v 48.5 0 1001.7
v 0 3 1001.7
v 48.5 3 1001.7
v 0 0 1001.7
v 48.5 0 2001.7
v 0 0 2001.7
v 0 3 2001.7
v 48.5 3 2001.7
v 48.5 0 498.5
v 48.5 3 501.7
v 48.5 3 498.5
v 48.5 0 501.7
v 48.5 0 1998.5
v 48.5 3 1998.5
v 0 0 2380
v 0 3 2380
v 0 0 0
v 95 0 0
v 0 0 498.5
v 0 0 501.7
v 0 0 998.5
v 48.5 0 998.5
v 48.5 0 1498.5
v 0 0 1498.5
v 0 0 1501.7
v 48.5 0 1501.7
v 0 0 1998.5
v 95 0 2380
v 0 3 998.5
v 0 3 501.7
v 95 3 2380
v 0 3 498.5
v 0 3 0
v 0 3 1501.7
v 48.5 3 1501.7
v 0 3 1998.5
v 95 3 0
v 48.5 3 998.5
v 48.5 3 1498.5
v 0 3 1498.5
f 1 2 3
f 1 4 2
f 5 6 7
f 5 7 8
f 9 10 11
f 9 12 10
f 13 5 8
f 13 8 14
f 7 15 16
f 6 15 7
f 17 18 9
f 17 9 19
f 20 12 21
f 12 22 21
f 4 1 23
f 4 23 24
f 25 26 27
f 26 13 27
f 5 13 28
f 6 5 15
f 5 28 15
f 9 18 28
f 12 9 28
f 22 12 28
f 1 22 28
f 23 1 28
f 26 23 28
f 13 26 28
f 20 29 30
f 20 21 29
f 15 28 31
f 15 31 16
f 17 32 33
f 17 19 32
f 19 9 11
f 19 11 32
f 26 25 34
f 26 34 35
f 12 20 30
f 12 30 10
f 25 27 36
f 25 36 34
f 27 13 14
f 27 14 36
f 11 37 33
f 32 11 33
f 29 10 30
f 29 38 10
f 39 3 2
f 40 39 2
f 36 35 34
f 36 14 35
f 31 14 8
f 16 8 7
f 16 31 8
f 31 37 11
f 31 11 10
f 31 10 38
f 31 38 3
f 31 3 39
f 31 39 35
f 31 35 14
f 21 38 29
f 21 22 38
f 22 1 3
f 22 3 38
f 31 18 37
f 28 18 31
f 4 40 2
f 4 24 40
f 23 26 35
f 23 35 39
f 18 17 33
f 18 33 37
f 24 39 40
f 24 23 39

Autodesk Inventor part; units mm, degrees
ref_plane "YZ Plane" through (0, 0, 0) normal (1, 0, 0) x (0, 1, 0)
ref_plane "XZ Plane" through (0, 0, 0) normal (0, 1, 0) x (-1, 0, 0)
ref_plane "XY Plane" through (0, 0, 0) normal (0, 0, 1) x (1, 0, 0)
sketch "Sketch6" plane through (0, 0, 0) normal (0, 1, 0) x (-1, 0, 0)
  line L0 (0, 0) -> (-95, 0)
  line L1 (-95, 0) -> (-95, 2380)
  line L2 (-95, 2380) -> (0, 2380)
  line L3 (0, 2380) -> (0, 0)
  dimension "d26" = 95
  dimension "d27" = 2380
extrude "Plate4" add sketch "Sketch6" along normal blind 3
sketch "Sketch7" plane through (0, 0, 0) normal (0, -1, 0) x (1, 0, 0)
  line L0 (0, 2380) -> (95, 2380) projected
  line L1 (0, 0) -> (0, 2380) projected
  line L2 (95, 0) -> (0, 0) projected
  line L3 (95, 2380) -> (95, 0) projected
  line L4 (0, 501.7) -> (48.5, 501.7)
  line L5 (48.5, 501.7) -> (48.5, 498.5)
  line L6 (48.5, 498.5) -> (0, 498.5)
  line L7 (0, 498.5) -> (0, 501.7)
  point P0 (0, 498.5)
  point P1 (0, 200)
  point P2 (46.4173, 200)
  point P3 (0, 498.5)
  dimension "d29" = 48.5
  dimension "d30" = 3.2
  dimension "d31" = 498.5
extrude "Extrusion2" cut sketch "Sketch7" against normal through all contours L4 L5 L6 L1
pattern_linear "Rectangular Pattern1" count 5 spacing 500 along (0, 0, 1) of "Extrusion2"
equation "\"d28\" = Thickness"
equation "\"BendReliefWidth\" = Thickness"
equation "\"BendReliefDepth\" = 0.5 * Thickness"
equation "\"CornerReliefSize\" = 4 * Thickness"
equation "\"MinimumRemnant\" = 2 * Thickness"
equation "\"TransitionRadius\" = BendRadius"
equation "\"JacobiRadiusSize\" = BendRadius"
equation "\"GapSize\" = Thickness"
equation "\"Thickness\" = 3"
equation "\"BendRadius\" = 5"
properties part number "BSH 046 stringer 6" material "09g2s"
